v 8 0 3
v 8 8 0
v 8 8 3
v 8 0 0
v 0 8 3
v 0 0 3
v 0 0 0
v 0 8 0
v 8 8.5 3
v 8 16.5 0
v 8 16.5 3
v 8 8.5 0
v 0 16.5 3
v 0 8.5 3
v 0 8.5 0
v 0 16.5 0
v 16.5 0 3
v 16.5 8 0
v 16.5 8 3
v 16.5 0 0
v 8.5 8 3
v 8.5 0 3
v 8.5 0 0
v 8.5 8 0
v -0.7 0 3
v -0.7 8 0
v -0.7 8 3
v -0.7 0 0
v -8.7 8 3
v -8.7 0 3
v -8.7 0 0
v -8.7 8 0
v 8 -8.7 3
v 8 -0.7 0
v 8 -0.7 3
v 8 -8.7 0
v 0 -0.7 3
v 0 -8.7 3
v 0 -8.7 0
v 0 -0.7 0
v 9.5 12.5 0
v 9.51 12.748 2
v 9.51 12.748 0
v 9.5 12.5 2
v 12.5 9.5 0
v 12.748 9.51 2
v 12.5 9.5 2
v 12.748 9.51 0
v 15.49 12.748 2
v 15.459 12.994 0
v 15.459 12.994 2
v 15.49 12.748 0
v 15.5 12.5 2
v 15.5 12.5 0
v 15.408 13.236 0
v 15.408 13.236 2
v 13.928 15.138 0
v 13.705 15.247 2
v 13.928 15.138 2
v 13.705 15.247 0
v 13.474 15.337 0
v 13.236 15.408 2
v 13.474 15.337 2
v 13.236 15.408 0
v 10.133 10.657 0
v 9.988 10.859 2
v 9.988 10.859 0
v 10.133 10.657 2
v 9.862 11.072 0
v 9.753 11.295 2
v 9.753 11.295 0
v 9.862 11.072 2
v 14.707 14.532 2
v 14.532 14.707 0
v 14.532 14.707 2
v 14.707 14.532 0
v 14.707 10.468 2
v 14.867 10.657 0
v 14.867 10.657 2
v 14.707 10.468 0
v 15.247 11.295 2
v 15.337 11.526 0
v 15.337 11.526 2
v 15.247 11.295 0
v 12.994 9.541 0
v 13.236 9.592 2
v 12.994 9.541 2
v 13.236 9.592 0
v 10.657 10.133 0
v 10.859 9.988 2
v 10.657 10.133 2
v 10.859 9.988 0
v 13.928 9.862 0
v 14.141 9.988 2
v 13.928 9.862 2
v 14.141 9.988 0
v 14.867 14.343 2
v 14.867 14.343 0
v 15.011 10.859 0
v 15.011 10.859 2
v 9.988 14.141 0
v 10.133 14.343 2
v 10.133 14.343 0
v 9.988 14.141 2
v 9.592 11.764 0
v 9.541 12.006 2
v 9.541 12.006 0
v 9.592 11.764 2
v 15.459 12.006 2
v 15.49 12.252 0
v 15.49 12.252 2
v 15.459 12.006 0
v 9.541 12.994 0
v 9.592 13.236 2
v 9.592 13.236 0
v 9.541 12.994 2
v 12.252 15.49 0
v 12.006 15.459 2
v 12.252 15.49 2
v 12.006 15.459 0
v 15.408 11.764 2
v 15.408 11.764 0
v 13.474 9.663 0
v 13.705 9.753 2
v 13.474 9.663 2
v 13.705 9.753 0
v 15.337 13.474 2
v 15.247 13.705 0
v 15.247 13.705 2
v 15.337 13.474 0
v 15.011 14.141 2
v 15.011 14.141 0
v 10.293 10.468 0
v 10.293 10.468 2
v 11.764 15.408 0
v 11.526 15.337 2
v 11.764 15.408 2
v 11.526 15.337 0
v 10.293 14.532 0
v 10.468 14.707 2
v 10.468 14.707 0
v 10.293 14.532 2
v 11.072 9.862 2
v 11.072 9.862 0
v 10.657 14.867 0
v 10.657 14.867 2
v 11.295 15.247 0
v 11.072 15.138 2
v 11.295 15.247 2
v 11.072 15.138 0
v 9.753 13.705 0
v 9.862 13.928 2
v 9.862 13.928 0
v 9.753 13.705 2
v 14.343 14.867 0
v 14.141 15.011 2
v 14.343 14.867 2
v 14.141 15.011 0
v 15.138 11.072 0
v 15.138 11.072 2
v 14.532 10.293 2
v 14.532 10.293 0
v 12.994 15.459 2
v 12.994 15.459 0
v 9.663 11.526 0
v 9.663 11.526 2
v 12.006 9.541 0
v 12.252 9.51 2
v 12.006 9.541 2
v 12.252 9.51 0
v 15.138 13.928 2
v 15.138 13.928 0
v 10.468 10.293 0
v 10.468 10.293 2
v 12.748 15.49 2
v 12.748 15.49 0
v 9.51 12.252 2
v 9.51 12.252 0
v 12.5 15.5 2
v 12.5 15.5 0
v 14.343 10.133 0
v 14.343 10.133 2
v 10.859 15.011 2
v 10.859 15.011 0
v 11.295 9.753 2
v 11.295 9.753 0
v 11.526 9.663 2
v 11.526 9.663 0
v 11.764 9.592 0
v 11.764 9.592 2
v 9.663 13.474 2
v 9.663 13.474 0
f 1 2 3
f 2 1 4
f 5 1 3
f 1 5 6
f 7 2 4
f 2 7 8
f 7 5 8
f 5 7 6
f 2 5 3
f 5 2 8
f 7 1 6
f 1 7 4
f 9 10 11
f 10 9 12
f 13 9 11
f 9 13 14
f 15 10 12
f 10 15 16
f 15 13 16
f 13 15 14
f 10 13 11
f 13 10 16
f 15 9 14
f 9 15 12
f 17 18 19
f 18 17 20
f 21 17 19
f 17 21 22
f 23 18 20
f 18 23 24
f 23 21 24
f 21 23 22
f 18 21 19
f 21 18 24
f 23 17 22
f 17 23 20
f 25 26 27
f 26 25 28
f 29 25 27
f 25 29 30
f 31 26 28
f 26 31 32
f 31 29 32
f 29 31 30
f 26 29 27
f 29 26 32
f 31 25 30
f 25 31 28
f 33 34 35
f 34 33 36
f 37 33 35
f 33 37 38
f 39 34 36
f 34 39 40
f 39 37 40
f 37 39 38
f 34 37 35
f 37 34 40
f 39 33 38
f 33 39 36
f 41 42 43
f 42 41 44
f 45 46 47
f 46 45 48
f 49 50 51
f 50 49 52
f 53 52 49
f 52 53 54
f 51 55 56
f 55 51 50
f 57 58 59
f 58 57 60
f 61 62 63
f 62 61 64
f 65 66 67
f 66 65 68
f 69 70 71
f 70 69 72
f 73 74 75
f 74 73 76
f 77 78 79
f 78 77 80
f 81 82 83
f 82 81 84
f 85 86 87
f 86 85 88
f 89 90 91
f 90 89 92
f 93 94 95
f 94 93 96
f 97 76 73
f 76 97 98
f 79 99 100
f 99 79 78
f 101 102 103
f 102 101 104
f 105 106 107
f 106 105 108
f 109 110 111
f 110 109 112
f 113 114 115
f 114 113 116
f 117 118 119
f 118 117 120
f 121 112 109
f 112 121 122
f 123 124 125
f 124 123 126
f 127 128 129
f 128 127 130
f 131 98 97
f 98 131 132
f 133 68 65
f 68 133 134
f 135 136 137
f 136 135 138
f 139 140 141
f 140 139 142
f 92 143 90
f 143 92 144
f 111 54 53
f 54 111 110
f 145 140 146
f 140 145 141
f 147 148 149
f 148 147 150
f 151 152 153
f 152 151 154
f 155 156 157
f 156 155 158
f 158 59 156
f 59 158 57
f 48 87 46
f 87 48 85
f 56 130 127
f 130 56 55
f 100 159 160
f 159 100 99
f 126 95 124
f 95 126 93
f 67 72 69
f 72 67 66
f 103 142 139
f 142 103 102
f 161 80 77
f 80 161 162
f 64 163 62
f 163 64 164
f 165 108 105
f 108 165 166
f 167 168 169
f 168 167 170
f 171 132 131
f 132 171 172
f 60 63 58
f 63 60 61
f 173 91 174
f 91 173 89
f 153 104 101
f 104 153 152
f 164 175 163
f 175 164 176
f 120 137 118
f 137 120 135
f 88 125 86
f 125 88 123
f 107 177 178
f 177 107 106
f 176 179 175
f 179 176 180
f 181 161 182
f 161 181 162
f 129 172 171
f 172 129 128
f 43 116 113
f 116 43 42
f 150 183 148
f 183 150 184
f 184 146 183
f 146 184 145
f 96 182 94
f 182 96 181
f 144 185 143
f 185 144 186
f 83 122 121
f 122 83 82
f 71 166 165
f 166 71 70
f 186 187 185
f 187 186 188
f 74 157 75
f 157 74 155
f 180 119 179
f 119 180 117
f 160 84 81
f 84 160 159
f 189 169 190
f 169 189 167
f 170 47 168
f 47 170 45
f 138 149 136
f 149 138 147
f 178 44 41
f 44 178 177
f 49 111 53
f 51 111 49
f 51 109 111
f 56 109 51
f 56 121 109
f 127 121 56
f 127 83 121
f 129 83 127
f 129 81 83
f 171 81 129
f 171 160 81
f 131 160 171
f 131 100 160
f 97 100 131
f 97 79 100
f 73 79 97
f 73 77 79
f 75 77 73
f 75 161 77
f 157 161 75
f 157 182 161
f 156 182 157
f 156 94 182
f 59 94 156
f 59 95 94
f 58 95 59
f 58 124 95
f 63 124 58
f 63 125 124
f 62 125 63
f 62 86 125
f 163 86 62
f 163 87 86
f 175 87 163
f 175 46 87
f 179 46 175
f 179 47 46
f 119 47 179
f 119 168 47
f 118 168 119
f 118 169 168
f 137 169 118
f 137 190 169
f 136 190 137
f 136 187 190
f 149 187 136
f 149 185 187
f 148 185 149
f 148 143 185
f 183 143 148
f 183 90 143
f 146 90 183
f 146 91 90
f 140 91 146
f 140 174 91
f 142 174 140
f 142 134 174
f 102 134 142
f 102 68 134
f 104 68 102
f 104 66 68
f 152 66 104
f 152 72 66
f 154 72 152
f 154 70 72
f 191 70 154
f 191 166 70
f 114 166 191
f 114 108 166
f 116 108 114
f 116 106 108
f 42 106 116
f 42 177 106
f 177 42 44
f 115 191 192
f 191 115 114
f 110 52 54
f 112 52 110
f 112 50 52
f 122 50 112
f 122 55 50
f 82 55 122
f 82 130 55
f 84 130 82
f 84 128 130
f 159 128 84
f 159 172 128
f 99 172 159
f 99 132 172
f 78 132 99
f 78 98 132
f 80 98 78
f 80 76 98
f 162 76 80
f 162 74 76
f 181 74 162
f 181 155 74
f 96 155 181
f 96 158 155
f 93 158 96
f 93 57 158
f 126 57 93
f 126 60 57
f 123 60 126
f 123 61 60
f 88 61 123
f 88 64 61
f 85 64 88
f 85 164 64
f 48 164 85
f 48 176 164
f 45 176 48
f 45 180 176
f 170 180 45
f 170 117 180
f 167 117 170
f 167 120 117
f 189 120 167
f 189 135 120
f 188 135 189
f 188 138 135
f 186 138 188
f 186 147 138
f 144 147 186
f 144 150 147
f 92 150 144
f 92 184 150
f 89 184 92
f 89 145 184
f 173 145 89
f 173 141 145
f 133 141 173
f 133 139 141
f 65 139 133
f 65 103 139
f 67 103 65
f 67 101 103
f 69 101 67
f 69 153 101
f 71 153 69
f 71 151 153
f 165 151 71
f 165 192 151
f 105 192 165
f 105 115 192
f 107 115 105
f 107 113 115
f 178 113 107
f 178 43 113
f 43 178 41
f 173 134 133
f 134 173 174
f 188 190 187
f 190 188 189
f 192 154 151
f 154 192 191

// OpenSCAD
//-----------Setup-----------//

//The total print height.
cubeHeight =3;

//The side of the squares.
cubeSide =8;

//The tolrance you want to test (distance between cubes).
tolerance =0.7;

//The second tolrance you want to test.
tolerance2 =0.5;

//-------End of setup-------//

//Disable $fn and $fa
$fn=0;
$fa=0.01;

//Use only $fs
//fine
$fs=0.25;

translate = cubeSide + tolerance;
translate2 = cubeSide + tolerance2;

markerTranslate = cubeSide + cubeSide/2 + tolerance2;

cube([cubeSide, cubeSide, cubeHeight]);

	translate([0, translate2, 0])
	{
		cube([cubeSide, cubeSide, cubeHeight]);
	}
	
	translate([translate2, 0, 0])
	{
		cube([cubeSide, cubeSide, cubeHeight]);
	}

	translate([translate*-1, 0, 0])
	{
		cube([cubeSide, cubeSide, cubeHeight]);
	}
	
	translate([0, translate*-1, 0])
	{
		cube([cubeSide, cubeSide, cubeHeight]);
	}

	translate([markerTranslate, markerTranslate, 0])
	{
		cylinder(2, cubeSide/2-1, cubeSide/2-1);
	}
